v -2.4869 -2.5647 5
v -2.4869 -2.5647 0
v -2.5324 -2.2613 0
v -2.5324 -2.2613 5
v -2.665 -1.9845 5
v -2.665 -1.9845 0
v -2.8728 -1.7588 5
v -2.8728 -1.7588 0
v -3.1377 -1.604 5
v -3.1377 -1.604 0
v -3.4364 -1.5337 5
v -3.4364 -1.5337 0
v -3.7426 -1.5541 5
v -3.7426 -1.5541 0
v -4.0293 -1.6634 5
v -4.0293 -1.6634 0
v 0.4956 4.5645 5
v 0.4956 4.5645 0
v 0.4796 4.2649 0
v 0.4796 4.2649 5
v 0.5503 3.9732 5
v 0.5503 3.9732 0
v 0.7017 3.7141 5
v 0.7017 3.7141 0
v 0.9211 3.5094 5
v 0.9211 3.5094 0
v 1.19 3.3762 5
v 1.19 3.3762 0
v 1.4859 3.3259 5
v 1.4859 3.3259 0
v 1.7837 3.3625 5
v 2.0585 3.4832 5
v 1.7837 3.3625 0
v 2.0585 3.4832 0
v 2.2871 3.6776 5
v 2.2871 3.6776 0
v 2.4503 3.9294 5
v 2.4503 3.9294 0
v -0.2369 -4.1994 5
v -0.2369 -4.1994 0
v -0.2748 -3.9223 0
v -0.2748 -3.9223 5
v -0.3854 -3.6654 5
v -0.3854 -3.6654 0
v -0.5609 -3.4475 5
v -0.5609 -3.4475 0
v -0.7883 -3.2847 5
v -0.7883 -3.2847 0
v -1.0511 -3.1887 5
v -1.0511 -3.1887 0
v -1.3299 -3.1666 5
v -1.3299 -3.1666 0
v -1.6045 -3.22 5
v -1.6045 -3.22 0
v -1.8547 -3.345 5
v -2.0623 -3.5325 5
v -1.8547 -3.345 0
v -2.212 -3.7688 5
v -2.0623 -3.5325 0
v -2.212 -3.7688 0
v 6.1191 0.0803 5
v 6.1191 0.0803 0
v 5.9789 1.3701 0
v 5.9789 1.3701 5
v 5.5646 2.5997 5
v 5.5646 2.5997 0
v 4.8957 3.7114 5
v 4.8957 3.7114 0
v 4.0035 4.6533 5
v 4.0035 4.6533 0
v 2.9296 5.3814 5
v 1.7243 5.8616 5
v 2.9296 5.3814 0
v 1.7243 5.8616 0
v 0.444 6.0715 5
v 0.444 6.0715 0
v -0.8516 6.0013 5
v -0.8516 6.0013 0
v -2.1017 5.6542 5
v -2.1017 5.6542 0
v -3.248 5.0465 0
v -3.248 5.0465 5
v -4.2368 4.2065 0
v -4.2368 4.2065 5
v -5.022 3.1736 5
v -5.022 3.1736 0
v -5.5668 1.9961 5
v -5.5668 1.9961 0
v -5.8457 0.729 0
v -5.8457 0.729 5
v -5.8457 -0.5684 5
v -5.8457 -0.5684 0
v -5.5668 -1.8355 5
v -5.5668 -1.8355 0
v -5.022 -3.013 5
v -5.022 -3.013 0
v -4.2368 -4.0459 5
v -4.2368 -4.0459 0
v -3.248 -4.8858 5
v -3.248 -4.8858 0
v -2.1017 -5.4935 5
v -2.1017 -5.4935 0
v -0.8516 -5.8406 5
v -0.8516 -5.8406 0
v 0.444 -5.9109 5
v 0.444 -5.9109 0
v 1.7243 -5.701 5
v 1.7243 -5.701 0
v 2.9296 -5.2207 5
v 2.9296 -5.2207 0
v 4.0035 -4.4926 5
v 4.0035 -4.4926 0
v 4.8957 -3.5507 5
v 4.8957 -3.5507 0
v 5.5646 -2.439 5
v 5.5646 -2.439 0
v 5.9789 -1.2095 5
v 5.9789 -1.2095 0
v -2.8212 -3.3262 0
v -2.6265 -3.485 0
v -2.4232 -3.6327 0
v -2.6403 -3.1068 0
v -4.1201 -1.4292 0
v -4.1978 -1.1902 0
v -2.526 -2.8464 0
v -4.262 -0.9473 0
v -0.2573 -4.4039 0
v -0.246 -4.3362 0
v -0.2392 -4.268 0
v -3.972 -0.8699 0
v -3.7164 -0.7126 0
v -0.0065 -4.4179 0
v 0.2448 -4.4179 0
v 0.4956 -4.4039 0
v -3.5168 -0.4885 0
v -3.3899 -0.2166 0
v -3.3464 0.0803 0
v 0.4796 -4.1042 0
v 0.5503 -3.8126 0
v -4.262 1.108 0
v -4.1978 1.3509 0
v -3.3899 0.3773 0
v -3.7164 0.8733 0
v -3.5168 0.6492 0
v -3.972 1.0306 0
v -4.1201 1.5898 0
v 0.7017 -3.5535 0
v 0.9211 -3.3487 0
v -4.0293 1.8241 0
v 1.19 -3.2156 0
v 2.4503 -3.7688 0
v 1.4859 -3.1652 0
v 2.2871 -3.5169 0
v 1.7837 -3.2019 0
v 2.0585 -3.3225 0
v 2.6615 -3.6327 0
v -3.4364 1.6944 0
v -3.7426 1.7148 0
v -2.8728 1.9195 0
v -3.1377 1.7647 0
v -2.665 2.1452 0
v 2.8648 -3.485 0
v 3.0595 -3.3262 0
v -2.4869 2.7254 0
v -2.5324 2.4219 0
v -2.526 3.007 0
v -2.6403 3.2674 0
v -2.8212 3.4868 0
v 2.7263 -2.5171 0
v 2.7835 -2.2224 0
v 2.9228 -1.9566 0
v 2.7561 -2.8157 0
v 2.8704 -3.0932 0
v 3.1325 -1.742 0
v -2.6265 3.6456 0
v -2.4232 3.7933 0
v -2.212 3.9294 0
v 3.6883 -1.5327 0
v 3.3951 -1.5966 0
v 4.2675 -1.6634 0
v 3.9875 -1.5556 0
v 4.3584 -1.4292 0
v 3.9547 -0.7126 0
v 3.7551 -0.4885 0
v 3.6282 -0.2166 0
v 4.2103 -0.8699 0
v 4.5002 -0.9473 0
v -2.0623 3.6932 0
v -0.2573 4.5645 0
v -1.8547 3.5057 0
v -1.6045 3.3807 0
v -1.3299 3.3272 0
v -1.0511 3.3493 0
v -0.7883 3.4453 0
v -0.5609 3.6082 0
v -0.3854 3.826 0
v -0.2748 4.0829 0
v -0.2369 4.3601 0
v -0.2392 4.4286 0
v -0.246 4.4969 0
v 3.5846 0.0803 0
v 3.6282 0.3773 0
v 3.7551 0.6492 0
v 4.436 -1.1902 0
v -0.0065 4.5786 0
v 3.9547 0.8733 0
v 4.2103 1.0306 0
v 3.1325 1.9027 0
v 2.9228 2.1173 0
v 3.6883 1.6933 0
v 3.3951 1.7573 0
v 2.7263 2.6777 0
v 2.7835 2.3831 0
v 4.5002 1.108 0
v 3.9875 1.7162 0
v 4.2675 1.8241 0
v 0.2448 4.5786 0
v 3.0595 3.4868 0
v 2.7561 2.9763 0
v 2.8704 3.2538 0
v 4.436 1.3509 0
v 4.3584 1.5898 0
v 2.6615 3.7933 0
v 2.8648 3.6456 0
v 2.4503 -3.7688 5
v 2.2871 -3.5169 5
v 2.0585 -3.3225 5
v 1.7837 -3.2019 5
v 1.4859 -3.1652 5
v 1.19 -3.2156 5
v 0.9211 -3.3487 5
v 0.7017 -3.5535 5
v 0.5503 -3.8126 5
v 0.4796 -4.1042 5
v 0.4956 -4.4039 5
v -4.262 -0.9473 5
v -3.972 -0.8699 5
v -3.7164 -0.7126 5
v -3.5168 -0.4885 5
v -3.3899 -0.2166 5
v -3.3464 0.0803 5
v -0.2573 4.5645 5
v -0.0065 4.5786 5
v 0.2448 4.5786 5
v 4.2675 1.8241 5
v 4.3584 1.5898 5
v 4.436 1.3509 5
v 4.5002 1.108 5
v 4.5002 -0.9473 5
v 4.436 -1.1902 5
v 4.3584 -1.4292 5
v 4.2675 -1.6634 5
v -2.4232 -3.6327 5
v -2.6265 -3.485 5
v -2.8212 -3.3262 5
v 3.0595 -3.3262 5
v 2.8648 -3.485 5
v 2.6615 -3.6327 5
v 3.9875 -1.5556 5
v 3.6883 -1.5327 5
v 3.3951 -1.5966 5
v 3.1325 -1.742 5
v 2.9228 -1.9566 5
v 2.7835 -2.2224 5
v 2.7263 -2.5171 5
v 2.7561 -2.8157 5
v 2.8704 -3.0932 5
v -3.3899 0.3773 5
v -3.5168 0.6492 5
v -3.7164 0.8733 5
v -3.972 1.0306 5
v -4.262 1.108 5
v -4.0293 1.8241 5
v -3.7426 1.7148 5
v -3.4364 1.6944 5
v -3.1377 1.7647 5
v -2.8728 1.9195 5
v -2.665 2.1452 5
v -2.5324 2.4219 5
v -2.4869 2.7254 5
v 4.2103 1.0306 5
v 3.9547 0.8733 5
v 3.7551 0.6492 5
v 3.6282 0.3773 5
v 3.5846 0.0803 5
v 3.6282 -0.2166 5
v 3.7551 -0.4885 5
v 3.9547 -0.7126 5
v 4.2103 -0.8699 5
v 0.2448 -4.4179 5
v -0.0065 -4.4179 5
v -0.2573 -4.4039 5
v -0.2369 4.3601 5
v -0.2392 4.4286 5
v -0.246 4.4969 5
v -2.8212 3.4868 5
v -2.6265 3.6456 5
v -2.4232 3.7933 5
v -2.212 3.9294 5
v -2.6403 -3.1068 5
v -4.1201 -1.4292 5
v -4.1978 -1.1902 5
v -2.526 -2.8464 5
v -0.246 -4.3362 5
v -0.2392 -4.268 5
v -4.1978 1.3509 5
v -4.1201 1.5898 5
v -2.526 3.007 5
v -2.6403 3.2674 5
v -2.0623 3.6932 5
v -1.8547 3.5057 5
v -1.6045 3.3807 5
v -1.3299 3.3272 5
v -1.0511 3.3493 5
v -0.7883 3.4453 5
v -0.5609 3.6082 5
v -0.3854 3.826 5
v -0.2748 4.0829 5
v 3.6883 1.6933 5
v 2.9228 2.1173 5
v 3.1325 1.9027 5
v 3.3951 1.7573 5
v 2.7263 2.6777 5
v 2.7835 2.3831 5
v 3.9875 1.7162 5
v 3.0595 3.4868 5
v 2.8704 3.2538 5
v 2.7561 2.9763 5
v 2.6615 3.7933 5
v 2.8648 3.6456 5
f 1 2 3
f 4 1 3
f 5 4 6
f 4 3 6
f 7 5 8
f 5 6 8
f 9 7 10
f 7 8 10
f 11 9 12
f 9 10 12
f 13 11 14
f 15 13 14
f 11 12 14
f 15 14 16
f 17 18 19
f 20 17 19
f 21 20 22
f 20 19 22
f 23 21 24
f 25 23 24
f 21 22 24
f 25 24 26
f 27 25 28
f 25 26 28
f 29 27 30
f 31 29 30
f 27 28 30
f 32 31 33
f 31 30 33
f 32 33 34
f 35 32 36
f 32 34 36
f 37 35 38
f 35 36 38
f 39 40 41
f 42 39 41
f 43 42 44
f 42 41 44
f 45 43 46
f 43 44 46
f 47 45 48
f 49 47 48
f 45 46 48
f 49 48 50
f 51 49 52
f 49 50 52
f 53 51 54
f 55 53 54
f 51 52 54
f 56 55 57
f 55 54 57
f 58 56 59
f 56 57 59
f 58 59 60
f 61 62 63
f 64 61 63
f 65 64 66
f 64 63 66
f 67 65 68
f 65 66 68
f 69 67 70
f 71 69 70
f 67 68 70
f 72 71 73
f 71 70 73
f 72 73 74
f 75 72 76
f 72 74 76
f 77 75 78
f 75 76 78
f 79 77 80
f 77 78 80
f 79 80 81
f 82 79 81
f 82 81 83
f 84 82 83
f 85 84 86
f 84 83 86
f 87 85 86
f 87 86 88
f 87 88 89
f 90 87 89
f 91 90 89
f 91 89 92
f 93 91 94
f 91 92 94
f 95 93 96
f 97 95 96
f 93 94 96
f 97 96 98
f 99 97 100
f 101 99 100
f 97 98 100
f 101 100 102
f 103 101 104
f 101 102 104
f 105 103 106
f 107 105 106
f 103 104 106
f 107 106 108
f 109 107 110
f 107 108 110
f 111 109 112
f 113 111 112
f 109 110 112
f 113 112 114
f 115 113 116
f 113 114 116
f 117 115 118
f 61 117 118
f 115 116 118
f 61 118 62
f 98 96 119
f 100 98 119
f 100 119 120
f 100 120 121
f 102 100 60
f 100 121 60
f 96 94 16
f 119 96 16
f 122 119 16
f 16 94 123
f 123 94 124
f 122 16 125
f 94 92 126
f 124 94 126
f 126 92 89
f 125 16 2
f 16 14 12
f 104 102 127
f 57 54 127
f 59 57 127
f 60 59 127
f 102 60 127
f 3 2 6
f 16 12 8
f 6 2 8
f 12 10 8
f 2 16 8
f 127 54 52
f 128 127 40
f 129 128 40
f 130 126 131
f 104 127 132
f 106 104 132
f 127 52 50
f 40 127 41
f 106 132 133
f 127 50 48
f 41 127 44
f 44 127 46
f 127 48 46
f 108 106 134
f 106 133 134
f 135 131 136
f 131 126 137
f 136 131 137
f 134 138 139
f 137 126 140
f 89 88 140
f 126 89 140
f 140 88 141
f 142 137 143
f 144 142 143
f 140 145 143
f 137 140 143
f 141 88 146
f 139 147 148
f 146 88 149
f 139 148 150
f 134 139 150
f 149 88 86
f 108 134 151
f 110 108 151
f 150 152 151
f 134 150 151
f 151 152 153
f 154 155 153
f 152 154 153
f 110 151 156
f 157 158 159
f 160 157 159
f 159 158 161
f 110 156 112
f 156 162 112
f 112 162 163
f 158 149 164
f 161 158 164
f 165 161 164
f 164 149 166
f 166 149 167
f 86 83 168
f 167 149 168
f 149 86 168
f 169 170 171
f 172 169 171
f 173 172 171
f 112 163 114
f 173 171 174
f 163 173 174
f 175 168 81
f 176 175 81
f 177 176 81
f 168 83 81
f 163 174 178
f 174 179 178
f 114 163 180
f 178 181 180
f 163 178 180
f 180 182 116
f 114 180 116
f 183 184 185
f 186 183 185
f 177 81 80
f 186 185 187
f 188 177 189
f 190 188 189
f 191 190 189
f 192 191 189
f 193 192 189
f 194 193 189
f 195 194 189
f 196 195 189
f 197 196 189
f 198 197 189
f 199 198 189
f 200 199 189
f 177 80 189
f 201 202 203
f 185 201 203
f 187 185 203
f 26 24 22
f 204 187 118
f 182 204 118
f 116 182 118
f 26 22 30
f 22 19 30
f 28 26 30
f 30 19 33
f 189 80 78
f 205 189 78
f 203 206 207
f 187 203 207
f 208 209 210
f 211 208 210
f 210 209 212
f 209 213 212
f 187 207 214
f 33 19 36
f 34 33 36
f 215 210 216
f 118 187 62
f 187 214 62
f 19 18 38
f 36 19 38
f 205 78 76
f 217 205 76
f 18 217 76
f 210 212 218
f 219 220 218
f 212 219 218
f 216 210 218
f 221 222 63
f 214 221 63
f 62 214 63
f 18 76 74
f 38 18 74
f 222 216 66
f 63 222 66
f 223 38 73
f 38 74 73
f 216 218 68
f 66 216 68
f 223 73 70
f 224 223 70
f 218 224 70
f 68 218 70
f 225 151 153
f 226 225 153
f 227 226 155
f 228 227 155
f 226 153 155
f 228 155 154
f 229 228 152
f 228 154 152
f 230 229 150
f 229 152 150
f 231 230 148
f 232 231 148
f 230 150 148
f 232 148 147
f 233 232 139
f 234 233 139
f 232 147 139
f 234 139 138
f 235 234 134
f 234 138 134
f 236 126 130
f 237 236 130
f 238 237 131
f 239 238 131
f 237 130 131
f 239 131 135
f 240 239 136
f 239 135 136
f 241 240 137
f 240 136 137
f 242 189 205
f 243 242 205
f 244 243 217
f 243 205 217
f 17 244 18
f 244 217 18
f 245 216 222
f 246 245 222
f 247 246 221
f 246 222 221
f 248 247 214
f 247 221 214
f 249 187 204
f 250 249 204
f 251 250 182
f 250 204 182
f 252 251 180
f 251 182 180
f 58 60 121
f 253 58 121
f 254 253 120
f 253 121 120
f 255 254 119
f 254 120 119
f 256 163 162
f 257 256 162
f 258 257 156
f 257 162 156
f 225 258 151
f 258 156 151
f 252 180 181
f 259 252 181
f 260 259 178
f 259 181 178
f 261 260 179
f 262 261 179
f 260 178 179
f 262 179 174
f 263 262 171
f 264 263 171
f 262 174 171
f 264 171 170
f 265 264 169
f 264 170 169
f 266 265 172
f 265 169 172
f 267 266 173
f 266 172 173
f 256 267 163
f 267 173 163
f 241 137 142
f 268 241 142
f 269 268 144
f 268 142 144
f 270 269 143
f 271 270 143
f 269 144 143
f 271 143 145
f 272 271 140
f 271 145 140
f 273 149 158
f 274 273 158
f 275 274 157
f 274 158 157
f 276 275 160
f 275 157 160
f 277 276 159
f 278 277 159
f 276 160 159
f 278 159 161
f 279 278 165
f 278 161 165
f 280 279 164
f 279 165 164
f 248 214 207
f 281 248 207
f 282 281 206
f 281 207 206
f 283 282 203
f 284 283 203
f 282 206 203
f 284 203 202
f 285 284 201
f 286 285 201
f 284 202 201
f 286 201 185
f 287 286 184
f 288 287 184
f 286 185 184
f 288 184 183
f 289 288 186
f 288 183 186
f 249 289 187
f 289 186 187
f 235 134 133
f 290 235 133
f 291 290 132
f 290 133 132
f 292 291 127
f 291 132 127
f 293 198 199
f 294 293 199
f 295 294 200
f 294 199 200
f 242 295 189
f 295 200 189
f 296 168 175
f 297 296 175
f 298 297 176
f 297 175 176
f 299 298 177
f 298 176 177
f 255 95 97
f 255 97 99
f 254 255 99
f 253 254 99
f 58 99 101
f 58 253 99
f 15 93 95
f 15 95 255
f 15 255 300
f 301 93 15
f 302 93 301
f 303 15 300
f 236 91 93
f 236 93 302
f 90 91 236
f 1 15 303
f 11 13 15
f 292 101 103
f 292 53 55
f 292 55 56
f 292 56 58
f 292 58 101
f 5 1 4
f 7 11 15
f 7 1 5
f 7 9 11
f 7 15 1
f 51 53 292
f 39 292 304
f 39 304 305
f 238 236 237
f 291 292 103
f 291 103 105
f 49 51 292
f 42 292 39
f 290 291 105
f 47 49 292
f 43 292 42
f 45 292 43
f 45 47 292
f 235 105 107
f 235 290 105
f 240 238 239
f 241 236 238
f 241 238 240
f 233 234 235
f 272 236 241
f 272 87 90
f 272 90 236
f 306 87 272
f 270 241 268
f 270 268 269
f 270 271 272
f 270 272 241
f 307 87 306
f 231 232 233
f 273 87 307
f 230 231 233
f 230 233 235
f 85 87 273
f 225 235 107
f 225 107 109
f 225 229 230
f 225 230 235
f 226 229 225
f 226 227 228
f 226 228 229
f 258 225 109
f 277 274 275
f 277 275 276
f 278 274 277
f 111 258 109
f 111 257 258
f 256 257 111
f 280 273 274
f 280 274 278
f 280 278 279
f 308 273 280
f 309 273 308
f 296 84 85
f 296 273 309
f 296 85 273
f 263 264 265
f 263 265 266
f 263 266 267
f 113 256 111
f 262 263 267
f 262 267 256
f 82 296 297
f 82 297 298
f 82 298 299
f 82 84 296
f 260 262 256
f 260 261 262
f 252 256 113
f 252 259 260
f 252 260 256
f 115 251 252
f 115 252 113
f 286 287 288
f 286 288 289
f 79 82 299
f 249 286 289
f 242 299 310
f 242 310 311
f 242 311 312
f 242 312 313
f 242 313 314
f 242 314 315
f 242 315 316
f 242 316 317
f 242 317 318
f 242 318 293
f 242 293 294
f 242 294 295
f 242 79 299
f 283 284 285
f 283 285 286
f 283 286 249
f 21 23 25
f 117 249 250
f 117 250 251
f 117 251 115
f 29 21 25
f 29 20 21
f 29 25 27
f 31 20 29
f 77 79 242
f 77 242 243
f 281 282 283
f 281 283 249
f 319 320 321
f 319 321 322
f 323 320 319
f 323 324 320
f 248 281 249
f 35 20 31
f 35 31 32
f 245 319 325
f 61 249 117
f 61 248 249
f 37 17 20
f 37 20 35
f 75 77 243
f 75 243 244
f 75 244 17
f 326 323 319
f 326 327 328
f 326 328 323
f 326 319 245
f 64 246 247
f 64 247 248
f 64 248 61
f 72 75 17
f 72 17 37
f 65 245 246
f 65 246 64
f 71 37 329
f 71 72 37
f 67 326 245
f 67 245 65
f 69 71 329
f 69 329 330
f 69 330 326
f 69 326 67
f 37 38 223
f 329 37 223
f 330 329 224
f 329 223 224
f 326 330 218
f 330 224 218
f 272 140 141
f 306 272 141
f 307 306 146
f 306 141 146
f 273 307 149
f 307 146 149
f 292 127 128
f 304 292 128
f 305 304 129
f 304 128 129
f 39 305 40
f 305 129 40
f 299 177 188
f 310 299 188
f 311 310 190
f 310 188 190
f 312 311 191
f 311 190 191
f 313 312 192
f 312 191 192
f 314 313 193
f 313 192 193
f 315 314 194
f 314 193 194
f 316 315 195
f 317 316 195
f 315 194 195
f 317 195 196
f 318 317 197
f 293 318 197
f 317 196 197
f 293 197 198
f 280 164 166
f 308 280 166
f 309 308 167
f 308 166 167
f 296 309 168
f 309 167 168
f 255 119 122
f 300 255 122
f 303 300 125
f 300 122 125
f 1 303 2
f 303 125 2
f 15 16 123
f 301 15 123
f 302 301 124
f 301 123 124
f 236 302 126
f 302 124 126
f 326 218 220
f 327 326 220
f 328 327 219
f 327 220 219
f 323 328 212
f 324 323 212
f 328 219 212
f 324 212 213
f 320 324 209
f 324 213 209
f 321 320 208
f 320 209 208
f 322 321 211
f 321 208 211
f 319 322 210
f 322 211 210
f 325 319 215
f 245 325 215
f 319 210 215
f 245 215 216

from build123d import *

# Parameters (mm, degrees)
F0_R     = 6
F1_DEPTH = 5


with BuildPart() as f1:
    # F0 (on Top) → F1 (new body)
    with BuildSketch(Plane.XY):
        with Locations((0.1191368553, 0.0803260972)):
            Circle(F0_R)
        with BuildLine():
            ThreePointArc((4.2675466454, 1.8240853161), (4.3988911787, 1.4709025719), (4.5002268275, 1.1079693501))
            ThreePointArc((4.5002268275, 1.1079693501), (5.3073148215, 0.8527258233), (5.6536368553, 0.0803260972))
            ThreePointArc((5.6536368553, 0.0803260972), (5.3073148215, -0.6920736289), (4.5002268275, -0.9473171557))
            ThreePointArc((4.5002268275, -0.9473171557), (4.3988911787, -1.3102503775), (4.2675466454, -1.6634331217))
            ThreePointArc((4.2675466454, -1.6634331217), (4.6528941109, -2.0427704321), (4.79421333, -2.5647075381))
            ThreePointArc((4.79421333, -2.5647075381), (4.1755248273, -3.5119620175), (3.059479548, -3.3261948332))
            ThreePointArc((3.059479548, -3.3261948332), (2.7641704906, -3.5602503775), (2.4503149228, -3.76877884))
            ThreePointArc((2.4503149228, -3.76877884), (2.5204661677, -3.9790445807), (2.54421333, -4.1994282261))
            ThreePointArc((2.54421333, -4.1994282261), (1.6124558319, -5.2288135905), (0.4956212985, -4.4038972987))
            ThreePointArc((0.4956212985, -4.4038972987), (0.1191368553, -4.4196739028), (-0.2573475879, -4.4038972987))
            ThreePointArc((-0.2573475879, -4.4038972987), (-1.5911177, -5.1832961922), (-2.2120412121, -3.76877884))
            ThreePointArc((-2.2120412121, -3.76877884), (-2.52589678, -3.5602503775), (-2.8212058374, -3.3261948332))
            ThreePointArc((-2.8212058374, -3.3261948332), (-4.3583677, -3.1727713816), (-4.0292729348, -1.6634331217))
            ThreePointArc((-4.0292729348, -1.6634331217), (-4.160617468, -1.3102503775), (-4.2619531169, -0.9473171557))
            ThreePointArc((-4.2619531169, -0.9473171557), (-5.4153631447, 0.0803260972), (-4.2619531169, 1.1079693501))
            ThreePointArc((-4.2619531169, 1.1079693501), (-4.160617468, 1.4709025719), (-4.0292729348, 1.8240853161))
            ThreePointArc((-4.0292729348, 1.8240853161), (-4.3583677, 3.333423576), (-2.8212058374, 3.4868470276))
            ThreePointArc((-2.8212058374, 3.4868470276), (-2.52589678, 3.7209025719), (-2.2120412121, 3.9294310345))
            ThreePointArc((-2.2120412121, 3.9294310345), (-1.5911177, 5.3439483866), (-0.2573475879, 4.5645494931))
            ThreePointArc((-0.2573475879, 4.5645494931), (0.1191368553, 4.5803260972), (0.4956212985, 4.5645494931))
            ThreePointArc((0.4956212985, 4.5645494931), (1.6124558319, 5.3894657849), (2.54421333, 4.3600804205))
            ThreePointArc((2.54421333, 4.3600804205), (2.5204661677, 4.1396967751), (2.4503149228, 3.9294310345))
            ThreePointArc((2.4503149228, 3.9294310345), (2.7641704906, 3.7209025719), (3.059479548, 3.4868470276))
            ThreePointArc((3.059479548, 3.4868470276), (4.1755248273, 3.6726142119), (4.79421333, 2.7253597325))
            ThreePointArc((4.79421333, 2.7253597325), (4.6528941109, 2.2034226265), (4.2675466454, 1.8240853161))
        make_face(mode=Mode.SUBTRACT)
        with BuildLine():
            ThreePointArc((4.5002268275, -0.9473171557), (4.5893105027, -0.4369239028), (4.6191368553, 0.0803260972))
            ThreePointArc((4.6191368553, 0.0803260972), (4.5893105027, 0.5975760972), (4.5002268275, 1.1079693501))
            ThreePointArc((4.5002268275, 1.1079693501), (3.5846368553, 0.0803260972), (4.5002268275, -0.9473171557))
        make_face()
        with BuildLine():
            ThreePointArc((4.5002268275, 1.1079693501), (4.5893105027, 0.5975760972), (4.6191368553, 0.0803260972))
            ThreePointArc((4.6191368553, 0.0803260972), (4.5893105027, -0.4369239028), (4.5002268275, -0.9473171557))
            ThreePointArc((4.5002268275, -0.9473171557), (5.3073148215, -0.6920736289), (5.6536368553, 0.0803260972))
            ThreePointArc((5.6536368553, 0.0803260972), (5.3073148215, 0.8527258233), (4.5002268275, 1.1079693501))
        make_face()
        with BuildLine():
            ThreePointArc((3.059479548, 3.4868470276), (2.9227852493, 2.117295889), (4.2675466454, 1.8240853161))
            ThreePointArc((4.2675466454, 1.8240853161), (3.75971333, 2.7253597325), (3.059479548, 3.4868470276))
        make_face()
        with BuildLine():
            ThreePointArc((3.059479548, 3.4868470276), (3.75971333, 2.7253597325), (4.2675466454, 1.8240853161))
            ThreePointArc((4.2675466454, 1.8240853161), (4.6528941109, 2.2034226265), (4.79421333, 2.7253597325))
            ThreePointArc((4.79421333, 2.7253597325), (4.1755248273, 3.6726142119), (3.059479548, 3.4868470276))
        make_face()
        with BuildLine():
            ThreePointArc((4.79421333, -2.5647075381), (4.6528941109, -2.0427704321), (4.2675466454, -1.6634331217))
            ThreePointArc((4.2675466454, -1.6634331217), (3.75971333, -2.5647075381), (3.059479548, -3.3261948332))
            ThreePointArc((3.059479548, -3.3261948332), (4.1755248273, -3.5119620175), (4.79421333, -2.5647075381))
        make_face()
        with BuildLine():
            ThreePointArc((3.059479548, -3.3261948332), (3.75971333, -2.5647075381), (4.2675466454, -1.6634331217))
            ThreePointArc((4.2675466454, -1.6634331217), (2.9227852493, -1.9566436946), (3.059479548, -3.3261948332))
        make_face()
        with BuildLine():
            ThreePointArc((0.4956212985, 4.5645494931), (1.1900352493, 3.3762124544), (2.4503149228, 3.9294310345))
            ThreePointArc((2.4503149228, 3.9294310345), (1.50971333, 4.3600804205), (0.4956212985, 4.5645494931))
        make_face()
        with BuildLine():
            ThreePointArc((0.4956212985, 4.5645494931), (1.50971333, 4.3600804205), (2.4503149228, 3.9294310345))
            ThreePointArc((2.4503149228, 3.9294310345), (2.5204661677, 4.1396967751), (2.54421333, 4.3600804205))
            ThreePointArc((2.54421333, 4.3600804205), (1.6124558319, 5.3894657849), (0.4956212985, 4.5645494931))
        make_face()
        with BuildLine():
            ThreePointArc((2.54421333, -4.1994282261), (2.5204661677, -3.9790445807), (2.4503149228, -3.76877884))
            ThreePointArc((2.4503149228, -3.76877884), (1.50971333, -4.1994282261), (0.4956212985, -4.4038972987))
            ThreePointArc((0.4956212985, -4.4038972987), (1.6124558319, -5.2288135905), (2.54421333, -4.1994282261))
        make_face()
        with BuildLine():
            ThreePointArc((0.4956212985, -4.4038972987), (1.50971333, -4.1994282261), (2.4503149228, -3.76877884))
            ThreePointArc((2.4503149228, -3.76877884), (1.1900352493, -3.21556026), (0.4956212985, -4.4038972987))
        make_face()
        with BuildLine():
            ThreePointArc((-0.2369396194, 4.3600804205), (-0.242054255, 4.4628229225), (-0.2573475879, 4.5645494931))
            ThreePointArc((-0.2573475879, 4.5645494931), (-1.2714396194, 4.3600804205), (-2.2120412121, 3.9294310345))
            ThreePointArc((-2.2120412121, 3.9294310345), (-1.051055974, 3.3493275829), (-0.2369396194, 4.3600804205))
        make_face()
        with BuildLine():
            ThreePointArc((-2.2120412121, 3.9294310345), (-1.2714396194, 4.3600804205), (-0.2573475879, 4.5645494931))
            ThreePointArc((-0.2573475879, 4.5645494931), (-1.5911177, 5.3439483866), (-2.2120412121, 3.9294310345))
        make_face()
        with BuildLine():
            ThreePointArc((-2.2120412121, -3.76877884), (-1.5911177, -5.1832961922), (-0.2573475879, -4.4038972987))
            ThreePointArc((-0.2573475879, -4.4038972987), (-1.2714396194, -4.1994282261), (-2.2120412121, -3.76877884))
        make_face()
        with BuildLine():
            ThreePointArc((-2.2120412121, -3.76877884), (-1.2714396194, -4.1994282261), (-0.2573475879, -4.4038972987))
            ThreePointArc((-0.2573475879, -4.4038972987), (-0.242054255, -4.302170728), (-0.2369396194, -4.1994282261))
            ThreePointArc((-0.2369396194, -4.1994282261), (-1.051055974, -3.1886753885), (-2.2120412121, -3.76877884))
        make_face()
        with BuildLine():
            ThreePointArc((-2.4869396194, 2.7253597325), (-2.57418514, 3.1411712298), (-2.8212058374, 3.4868470276))
            ThreePointArc((-2.8212058374, 3.4868470276), (-3.5214396194, 2.7253597325), (-4.0292729348, 1.8240853161))
            ThreePointArc((-4.0292729348, 1.8240853161), (-2.9995025134, 1.8321789516), (-2.4869396194, 2.7253597325))
        make_face()
        with BuildLine():
            ThreePointArc((-4.0292729348, 1.8240853161), (-3.5214396194, 2.7253597325), (-2.8212058374, 3.4868470276))
            ThreePointArc((-2.8212058374, 3.4868470276), (-4.3583677, 3.333423576), (-4.0292729348, 1.8240853161))
        make_face()
        with BuildLine():
            ThreePointArc((-4.0292729348, -1.6634331217), (-4.3583677, -3.1727713816), (-2.8212058374, -3.3261948332))
            ThreePointArc((-2.8212058374, -3.3261948332), (-3.5214396194, -2.5647075381), (-4.0292729348, -1.6634331217))
        make_face()
        with BuildLine():
            ThreePointArc((-4.0292729348, -1.6634331217), (-3.5214396194, -2.5647075381), (-2.8212058374, -3.3261948332))
            ThreePointArc((-2.8212058374, -3.3261948332), (-2.57418514, -2.9805190354), (-2.4869396194, -2.5647075381))
            ThreePointArc((-2.4869396194, -2.5647075381), (-2.9995025134, -1.6715267572), (-4.0292729348, -1.6634331217))
        make_face()
        with BuildLine():
            ThreePointArc((-3.3463631447, 0.0803260972), (-3.6084634186, 0.7685040634), (-4.2619531169, 1.1079693501))
            ThreePointArc((-4.2619531169, 1.1079693501), (-4.3808631447, 0.0803260972), (-4.2619531169, -0.9473171557))
            ThreePointArc((-4.2619531169, -0.9473171557), (-3.6084634186, -0.607851869), (-3.3463631447, 0.0803260972))
        make_face()
        with BuildLine():
            ThreePointArc((-4.2619531169, -0.9473171557), (-4.3808631447, 0.0803260972), (-4.2619531169, 1.1079693501))
            ThreePointArc((-4.2619531169, 1.1079693501), (-5.4153631447, 0.0803260972), (-4.2619531169, -0.9473171557))
        make_face()
    extrude(amount=F1_DEPTH)


solid = f1.part
